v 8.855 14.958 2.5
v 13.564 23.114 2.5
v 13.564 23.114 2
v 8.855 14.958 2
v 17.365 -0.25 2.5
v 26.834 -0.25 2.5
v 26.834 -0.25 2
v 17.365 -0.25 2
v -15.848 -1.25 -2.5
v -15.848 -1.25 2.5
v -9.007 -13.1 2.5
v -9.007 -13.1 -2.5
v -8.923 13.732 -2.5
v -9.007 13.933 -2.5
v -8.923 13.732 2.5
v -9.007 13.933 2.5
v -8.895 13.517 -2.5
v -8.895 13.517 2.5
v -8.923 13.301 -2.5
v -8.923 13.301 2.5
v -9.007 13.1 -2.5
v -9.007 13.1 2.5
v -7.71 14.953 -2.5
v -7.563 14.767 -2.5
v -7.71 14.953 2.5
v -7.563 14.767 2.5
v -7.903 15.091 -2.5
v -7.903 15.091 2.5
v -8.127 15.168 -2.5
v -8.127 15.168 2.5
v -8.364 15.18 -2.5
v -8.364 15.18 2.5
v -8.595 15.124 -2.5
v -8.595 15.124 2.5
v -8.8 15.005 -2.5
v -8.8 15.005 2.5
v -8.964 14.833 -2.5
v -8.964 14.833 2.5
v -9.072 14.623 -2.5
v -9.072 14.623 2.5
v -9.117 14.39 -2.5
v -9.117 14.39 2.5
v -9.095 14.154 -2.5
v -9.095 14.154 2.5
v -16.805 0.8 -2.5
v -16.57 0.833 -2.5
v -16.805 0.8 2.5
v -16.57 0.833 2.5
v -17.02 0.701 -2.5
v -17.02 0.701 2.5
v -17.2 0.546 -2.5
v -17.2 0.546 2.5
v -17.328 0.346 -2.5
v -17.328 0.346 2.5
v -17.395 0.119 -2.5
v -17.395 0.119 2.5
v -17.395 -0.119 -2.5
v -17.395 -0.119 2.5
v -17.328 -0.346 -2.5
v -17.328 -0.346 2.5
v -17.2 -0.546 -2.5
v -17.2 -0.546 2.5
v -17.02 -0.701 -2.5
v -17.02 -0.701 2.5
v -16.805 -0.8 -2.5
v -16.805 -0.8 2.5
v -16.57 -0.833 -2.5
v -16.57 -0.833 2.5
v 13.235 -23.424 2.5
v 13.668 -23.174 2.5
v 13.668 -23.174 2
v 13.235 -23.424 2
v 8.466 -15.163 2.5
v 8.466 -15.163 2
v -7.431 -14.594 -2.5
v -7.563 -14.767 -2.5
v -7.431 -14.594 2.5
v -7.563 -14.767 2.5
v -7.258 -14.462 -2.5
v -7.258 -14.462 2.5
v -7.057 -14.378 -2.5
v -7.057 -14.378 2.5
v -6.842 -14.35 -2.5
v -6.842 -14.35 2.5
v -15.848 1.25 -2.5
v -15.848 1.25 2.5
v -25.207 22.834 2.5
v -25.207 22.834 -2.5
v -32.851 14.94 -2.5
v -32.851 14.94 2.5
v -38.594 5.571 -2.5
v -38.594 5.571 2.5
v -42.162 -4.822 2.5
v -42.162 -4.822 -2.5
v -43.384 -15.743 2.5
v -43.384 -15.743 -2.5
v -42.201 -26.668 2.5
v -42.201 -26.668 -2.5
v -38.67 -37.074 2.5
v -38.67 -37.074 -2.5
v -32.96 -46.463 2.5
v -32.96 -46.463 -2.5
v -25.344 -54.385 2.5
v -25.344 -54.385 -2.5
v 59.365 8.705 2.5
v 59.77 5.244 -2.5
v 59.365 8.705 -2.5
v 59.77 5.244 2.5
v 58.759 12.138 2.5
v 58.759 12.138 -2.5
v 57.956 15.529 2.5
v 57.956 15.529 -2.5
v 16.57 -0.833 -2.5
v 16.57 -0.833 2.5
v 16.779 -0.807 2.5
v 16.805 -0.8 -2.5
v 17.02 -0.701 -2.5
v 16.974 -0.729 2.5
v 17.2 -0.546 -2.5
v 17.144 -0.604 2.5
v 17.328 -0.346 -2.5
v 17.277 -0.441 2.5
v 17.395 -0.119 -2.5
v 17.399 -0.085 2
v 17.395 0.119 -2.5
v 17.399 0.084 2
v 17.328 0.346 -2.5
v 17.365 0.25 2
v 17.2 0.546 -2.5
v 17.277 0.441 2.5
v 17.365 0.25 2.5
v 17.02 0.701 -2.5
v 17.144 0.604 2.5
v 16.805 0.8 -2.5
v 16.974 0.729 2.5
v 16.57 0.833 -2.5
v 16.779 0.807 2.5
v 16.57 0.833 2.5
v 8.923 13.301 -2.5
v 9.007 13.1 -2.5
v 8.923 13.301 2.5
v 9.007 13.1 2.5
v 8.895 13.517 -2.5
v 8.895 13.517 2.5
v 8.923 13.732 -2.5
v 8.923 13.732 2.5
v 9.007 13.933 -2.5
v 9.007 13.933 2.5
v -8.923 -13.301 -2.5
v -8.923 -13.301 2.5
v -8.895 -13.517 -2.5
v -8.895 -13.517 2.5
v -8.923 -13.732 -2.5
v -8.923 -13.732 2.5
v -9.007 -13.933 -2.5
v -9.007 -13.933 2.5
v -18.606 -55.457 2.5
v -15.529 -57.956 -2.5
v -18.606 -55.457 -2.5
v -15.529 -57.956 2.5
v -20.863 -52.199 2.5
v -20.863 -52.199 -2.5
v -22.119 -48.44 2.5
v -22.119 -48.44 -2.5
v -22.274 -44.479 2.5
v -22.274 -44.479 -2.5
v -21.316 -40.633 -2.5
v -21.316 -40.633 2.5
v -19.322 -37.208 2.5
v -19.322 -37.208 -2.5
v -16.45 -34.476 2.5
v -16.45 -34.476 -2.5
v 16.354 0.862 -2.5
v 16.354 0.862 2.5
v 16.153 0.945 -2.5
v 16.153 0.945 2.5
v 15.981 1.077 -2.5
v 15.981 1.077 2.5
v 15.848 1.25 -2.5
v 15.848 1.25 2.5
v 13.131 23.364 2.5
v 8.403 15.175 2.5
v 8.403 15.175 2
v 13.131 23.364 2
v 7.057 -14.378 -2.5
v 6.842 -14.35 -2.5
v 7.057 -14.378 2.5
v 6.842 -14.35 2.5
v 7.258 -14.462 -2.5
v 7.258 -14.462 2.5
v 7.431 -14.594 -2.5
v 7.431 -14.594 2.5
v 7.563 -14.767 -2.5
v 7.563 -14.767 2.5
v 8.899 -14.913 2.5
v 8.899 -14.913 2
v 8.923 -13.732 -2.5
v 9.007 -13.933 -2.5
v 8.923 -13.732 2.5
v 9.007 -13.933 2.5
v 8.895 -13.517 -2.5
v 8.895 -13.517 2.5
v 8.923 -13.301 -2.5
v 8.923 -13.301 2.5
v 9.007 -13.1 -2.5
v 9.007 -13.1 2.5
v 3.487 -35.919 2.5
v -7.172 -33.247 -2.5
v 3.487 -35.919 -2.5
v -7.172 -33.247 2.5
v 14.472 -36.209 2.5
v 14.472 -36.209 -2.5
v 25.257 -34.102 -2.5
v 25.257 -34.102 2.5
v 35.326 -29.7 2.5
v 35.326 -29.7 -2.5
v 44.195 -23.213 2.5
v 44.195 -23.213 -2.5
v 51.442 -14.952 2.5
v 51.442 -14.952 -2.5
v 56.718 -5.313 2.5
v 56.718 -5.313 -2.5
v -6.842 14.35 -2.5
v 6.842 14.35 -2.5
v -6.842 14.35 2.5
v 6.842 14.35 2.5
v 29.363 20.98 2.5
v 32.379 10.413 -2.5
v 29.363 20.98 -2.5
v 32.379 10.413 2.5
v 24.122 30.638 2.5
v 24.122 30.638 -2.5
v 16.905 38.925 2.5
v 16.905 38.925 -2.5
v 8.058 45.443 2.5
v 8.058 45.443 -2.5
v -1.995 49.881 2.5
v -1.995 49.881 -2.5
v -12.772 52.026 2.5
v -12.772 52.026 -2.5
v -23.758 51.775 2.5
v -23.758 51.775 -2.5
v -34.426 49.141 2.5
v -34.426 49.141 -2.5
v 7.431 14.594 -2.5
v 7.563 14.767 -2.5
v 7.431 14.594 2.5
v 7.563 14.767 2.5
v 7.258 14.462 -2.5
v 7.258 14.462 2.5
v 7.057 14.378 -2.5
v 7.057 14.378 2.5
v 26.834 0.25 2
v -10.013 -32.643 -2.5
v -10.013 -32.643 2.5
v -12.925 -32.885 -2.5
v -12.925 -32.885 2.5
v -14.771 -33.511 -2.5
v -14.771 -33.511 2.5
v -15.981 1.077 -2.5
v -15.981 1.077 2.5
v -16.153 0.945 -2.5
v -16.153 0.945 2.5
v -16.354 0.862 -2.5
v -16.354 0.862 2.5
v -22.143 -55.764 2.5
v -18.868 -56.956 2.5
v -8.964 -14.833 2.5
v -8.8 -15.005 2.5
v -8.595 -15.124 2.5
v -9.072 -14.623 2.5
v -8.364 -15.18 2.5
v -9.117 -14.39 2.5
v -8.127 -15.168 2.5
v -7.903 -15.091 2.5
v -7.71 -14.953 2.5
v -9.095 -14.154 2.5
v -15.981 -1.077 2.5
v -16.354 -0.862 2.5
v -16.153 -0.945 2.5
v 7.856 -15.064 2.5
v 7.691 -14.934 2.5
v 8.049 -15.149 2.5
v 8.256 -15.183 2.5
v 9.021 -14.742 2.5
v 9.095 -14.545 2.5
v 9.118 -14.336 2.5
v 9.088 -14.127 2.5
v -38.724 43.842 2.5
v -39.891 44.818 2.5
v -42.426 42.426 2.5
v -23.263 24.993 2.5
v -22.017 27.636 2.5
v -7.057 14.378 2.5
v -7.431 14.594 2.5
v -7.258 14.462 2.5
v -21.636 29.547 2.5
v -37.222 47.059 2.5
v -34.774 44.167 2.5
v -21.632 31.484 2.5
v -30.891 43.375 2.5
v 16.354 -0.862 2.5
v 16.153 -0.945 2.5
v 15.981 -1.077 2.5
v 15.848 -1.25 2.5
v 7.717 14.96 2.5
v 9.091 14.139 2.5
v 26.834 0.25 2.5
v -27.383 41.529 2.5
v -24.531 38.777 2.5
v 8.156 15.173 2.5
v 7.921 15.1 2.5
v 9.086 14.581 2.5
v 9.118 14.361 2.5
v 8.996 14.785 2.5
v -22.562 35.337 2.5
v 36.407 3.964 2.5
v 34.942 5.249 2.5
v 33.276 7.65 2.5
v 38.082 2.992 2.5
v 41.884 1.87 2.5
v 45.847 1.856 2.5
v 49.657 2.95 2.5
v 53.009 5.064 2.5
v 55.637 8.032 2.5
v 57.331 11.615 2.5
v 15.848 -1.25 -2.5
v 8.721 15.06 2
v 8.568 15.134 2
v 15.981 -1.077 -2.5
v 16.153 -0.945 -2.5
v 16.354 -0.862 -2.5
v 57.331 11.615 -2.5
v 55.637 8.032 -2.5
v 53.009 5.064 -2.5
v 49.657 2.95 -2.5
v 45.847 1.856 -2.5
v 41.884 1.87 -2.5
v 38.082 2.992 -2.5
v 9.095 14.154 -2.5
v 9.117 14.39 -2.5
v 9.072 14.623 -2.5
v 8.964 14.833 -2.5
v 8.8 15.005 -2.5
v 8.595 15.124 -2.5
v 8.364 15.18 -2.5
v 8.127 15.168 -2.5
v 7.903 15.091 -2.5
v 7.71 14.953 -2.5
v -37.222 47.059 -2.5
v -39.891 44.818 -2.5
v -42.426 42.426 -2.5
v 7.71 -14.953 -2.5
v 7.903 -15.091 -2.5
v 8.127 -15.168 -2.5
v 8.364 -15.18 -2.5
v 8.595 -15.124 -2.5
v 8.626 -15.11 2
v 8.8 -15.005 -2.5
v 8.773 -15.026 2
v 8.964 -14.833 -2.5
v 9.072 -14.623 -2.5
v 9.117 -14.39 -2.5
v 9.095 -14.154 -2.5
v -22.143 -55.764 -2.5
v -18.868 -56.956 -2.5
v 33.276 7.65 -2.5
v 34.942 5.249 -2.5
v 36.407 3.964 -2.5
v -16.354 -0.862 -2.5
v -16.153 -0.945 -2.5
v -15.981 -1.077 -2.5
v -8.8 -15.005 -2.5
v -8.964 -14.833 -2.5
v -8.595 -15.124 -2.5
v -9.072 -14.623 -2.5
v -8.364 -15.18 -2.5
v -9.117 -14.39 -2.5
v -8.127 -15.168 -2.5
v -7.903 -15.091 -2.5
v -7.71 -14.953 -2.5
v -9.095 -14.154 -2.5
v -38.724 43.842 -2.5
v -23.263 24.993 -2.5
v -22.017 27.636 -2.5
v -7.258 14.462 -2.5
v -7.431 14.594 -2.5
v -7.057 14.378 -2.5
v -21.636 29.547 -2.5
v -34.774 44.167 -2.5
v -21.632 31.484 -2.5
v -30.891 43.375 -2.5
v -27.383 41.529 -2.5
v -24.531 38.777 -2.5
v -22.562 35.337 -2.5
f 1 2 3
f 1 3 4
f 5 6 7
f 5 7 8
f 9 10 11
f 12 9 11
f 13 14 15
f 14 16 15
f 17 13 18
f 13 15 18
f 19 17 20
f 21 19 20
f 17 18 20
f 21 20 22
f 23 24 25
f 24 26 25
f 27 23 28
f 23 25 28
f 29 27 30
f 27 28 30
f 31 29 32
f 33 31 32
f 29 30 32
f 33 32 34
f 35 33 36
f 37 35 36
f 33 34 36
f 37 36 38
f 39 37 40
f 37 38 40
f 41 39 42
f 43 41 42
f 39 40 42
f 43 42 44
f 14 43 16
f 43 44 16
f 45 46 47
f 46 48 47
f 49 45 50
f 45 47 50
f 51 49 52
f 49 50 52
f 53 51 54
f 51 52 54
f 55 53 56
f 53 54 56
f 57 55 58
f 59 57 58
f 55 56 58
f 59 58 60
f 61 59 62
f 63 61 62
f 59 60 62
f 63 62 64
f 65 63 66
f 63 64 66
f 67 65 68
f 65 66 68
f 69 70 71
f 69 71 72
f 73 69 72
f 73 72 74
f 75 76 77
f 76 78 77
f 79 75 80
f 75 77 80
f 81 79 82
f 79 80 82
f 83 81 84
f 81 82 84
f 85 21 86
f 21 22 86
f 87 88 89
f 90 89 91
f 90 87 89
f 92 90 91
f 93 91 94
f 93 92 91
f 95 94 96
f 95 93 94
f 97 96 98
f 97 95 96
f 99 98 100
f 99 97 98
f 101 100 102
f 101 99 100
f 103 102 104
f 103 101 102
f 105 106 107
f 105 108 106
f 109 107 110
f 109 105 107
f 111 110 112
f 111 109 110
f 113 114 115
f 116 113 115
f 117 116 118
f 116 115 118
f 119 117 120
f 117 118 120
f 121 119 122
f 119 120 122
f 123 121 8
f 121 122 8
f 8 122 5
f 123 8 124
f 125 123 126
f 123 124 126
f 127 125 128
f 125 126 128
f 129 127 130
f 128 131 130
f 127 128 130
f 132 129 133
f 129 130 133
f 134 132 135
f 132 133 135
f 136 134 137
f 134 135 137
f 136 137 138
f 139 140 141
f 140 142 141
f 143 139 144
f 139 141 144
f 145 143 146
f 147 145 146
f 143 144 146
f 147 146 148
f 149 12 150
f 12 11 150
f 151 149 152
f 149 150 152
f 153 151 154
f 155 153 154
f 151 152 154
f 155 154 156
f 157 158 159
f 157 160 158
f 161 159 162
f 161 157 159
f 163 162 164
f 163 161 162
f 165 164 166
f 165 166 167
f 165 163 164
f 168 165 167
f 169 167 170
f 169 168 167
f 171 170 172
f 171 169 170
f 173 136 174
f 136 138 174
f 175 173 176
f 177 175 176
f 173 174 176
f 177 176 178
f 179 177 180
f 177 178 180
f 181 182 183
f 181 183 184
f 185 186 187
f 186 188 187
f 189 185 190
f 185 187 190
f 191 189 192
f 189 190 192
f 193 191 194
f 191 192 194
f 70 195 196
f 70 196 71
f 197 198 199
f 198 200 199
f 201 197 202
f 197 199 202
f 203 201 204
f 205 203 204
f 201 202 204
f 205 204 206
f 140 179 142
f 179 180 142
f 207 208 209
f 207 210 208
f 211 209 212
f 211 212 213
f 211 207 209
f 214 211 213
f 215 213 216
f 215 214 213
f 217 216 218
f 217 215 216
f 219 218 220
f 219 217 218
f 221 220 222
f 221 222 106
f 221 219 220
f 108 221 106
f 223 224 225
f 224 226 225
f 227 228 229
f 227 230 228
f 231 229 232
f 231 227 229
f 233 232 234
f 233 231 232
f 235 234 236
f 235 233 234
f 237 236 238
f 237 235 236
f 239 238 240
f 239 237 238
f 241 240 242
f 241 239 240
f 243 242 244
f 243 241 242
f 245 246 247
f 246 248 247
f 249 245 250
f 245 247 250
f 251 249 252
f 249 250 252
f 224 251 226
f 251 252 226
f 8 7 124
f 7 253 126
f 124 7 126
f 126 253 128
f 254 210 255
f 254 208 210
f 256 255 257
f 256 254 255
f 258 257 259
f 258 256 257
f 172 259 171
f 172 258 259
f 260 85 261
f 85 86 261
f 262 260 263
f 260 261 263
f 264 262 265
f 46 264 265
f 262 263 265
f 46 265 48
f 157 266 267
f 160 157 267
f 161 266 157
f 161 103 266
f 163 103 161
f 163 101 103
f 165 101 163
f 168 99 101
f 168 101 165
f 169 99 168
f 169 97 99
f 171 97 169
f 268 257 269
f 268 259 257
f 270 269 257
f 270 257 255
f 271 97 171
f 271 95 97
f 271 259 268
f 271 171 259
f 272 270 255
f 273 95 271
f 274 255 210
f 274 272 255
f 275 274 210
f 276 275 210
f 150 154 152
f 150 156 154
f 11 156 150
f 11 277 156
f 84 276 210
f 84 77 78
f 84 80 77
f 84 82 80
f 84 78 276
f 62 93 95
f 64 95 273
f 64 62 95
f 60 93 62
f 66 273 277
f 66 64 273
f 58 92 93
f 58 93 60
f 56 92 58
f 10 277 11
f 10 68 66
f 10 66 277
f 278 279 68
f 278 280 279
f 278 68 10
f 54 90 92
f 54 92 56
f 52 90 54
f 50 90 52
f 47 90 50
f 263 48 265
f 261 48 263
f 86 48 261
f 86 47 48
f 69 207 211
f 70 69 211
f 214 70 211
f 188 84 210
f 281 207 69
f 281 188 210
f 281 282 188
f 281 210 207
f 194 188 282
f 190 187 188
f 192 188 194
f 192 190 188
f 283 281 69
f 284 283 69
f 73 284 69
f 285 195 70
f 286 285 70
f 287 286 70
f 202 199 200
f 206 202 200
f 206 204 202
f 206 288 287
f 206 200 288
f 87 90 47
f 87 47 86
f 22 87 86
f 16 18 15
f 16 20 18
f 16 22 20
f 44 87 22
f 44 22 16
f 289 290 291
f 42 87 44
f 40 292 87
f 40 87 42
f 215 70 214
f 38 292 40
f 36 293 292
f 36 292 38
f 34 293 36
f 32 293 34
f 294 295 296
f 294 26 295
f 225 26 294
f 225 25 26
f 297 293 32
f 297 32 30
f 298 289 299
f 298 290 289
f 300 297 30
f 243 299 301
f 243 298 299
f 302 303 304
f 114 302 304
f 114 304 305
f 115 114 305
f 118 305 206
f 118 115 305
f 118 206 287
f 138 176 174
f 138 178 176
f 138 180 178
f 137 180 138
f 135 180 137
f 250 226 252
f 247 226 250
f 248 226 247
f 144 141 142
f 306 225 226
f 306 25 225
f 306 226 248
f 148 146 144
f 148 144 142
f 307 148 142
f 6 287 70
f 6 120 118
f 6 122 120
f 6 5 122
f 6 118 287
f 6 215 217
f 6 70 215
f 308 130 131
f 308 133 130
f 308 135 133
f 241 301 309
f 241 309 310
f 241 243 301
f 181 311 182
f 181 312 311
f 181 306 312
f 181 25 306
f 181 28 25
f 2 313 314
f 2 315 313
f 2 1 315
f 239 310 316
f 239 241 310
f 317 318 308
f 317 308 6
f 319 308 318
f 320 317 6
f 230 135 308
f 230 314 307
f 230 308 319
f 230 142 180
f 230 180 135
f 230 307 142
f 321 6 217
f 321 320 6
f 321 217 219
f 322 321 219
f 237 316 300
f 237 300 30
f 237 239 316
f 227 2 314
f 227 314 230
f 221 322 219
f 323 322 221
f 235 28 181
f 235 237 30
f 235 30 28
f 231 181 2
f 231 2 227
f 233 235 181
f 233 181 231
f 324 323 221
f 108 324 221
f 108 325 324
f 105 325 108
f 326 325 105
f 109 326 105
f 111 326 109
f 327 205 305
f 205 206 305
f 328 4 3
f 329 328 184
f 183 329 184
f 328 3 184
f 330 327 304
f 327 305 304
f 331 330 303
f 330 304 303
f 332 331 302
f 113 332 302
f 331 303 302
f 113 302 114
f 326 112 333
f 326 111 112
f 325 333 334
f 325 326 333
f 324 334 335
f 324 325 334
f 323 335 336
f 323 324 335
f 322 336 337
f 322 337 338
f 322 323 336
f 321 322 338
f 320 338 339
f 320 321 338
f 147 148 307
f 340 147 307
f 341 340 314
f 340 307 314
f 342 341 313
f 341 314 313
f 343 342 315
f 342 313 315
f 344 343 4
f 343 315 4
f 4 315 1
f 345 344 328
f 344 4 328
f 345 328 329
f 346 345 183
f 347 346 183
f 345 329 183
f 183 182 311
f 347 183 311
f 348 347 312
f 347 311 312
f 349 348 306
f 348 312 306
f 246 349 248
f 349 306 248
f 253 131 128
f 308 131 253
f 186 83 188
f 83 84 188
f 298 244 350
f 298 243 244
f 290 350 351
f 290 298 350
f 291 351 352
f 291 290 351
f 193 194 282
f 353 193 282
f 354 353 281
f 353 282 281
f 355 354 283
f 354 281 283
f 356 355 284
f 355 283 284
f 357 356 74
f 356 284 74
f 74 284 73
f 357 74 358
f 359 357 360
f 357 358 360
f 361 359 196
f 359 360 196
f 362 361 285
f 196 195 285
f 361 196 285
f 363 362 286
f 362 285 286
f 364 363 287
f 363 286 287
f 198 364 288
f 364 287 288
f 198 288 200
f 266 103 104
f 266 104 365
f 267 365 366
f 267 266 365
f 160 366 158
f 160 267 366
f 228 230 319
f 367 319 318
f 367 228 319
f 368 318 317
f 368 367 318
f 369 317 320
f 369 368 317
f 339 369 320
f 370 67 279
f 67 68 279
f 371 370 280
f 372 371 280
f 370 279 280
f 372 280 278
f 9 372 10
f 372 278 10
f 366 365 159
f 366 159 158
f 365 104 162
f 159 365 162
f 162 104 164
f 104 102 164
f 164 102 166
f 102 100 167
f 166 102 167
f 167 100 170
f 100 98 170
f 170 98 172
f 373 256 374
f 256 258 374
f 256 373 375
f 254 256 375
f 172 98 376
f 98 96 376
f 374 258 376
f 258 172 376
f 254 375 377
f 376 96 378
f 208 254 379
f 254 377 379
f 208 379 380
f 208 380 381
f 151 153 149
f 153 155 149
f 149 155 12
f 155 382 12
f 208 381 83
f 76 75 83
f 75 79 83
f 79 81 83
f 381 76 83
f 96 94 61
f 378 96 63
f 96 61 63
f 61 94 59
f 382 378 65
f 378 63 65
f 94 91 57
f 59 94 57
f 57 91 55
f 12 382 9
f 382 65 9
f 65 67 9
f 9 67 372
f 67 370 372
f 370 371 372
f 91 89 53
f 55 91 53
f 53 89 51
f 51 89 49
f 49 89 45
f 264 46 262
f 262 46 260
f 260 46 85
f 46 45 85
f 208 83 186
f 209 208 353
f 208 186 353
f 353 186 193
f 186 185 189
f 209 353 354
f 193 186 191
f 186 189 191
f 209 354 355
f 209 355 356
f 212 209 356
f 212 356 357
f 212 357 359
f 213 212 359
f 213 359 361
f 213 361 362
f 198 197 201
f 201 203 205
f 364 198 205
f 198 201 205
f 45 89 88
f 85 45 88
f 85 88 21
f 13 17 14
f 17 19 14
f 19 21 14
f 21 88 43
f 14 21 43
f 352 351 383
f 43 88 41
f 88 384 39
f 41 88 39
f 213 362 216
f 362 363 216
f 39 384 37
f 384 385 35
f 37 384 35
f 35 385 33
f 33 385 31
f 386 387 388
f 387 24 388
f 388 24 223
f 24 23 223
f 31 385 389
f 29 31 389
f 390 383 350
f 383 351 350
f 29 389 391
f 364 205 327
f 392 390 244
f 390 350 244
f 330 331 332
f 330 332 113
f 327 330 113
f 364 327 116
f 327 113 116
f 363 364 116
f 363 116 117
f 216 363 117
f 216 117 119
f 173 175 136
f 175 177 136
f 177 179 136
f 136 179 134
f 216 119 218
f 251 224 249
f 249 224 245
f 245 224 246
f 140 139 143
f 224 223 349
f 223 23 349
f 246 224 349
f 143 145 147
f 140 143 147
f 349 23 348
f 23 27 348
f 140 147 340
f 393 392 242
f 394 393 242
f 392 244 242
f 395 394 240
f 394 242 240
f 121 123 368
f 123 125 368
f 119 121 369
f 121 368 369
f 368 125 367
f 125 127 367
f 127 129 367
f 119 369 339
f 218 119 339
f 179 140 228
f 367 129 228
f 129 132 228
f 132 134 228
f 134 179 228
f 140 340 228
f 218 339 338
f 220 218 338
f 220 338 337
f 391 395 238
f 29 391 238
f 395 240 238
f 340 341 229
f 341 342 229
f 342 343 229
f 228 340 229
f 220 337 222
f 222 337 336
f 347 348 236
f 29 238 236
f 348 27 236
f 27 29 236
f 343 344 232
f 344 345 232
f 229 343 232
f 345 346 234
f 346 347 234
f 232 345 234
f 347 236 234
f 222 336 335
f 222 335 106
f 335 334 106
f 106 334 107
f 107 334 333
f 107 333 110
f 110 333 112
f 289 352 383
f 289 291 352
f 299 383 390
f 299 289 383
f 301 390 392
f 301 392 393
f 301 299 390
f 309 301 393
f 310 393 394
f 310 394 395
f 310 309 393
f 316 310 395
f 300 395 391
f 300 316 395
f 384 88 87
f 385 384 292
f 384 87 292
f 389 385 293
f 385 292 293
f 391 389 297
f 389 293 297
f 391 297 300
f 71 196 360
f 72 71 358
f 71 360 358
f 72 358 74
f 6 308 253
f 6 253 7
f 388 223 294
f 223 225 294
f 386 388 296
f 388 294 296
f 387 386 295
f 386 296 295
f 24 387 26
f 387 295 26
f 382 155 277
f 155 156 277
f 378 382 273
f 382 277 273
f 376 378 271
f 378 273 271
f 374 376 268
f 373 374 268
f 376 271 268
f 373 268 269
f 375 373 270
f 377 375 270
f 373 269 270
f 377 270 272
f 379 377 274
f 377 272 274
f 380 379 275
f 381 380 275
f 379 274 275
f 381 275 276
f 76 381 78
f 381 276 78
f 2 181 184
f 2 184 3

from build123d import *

# Parameters (mm, degrees)
BOSS_EXTRUDE1_DEPTH = 2.5
FILLET1_R           = 10
CUT_EXTRUDE1_DEPTH  = 0.5


with BuildPart() as part:
    # Sketch1 → Boss-Extrude1 (new, symmetric)
    with BuildSketch(Plane.XY):
        with BuildLine():
            ThreePointArc((-34.426436475, 49.140822863), (-38.572797774, 45.958016405), (-42.426406871, 42.426406871))
            ThreePointArc((-42.426406871, 42.426406871), (-26.29235792, 40.654943242), (-22.609103215, 24.847373735))
            ThreePointArc((-22.609103215, 24.847373735), (-43.353983992, -14.099744614), (-25.343982725, -54.38457998))
            ThreePointArc((-25.343982725, -54.38457998), (-20.514410827, -56.38403097), (-15.529142706, -57.955549577))
            ThreePointArc((-15.529142706, -57.955549577), (-22.062034677, -43.097321505), (-10.213905264, -32.003744609))
            ThreePointArc((-10.213905264, -32.003744609), (33.887729018, -30.495779185), (59.7704192, 5.243757117))
            ThreePointArc((59.7704192, 5.243757117), (59.087208601, 10.426014565), (57.955549577, 15.529142706))
            ThreePointArc((57.955549577, 15.529142706), (48.354392597, 2.442378263), (32.82300848, 7.156370874))
            ThreePointArc((32.82300848, 7.156370874), (9.466254973, 44.595523799), (-34.426436475, 49.140822863))
        make_face()
        with BuildLine():
            Line((-15.848264889, -1.25), (-9.006664199, -13.1))
            ThreePointArc((-9.006664199, -13.1), (-8.895018703, -13.516666667), (-9.006664199, -13.933333333))
            ThreePointArc((-9.006664199, -13.933333333), (-8.70164303, -15.071687836), (-7.563288526, -14.766666667))
            ThreePointArc((-7.563288526, -14.766666667), (-7.258267357, -14.461645497), (-6.84160069, -14.35))
            Line((-6.84160069, -14.35), (6.84160069, -14.35))
            ThreePointArc((6.84160069, -14.35), (7.258267357, -14.461645497), (7.563288526, -14.766666667))
            ThreePointArc((7.563288526, -14.766666667), (8.70164303, -15.071687836), (9.006664199, -13.933333333))
            ThreePointArc((9.006664199, -13.933333333), (8.895018703, -13.516666667), (9.006664199, -13.1))
            Line((9.006664199, -13.1), (15.848264889, -1.25))
            ThreePointArc((15.848264889, -1.25), (16.153286059, -0.94497883), (16.569952726, -0.833333333))
            ThreePointArc((16.569952726, -0.833333333), (17.403286059, 0), (16.569952726, 0.833333333))
            ThreePointArc((16.569952726, 0.833333333), (16.153286059, 0.94497883), (15.848264889, 1.25))
            Line((15.848264889, 1.25), (9.006664199, 13.1))
            ThreePointArc((9.006664199, 13.1), (8.895018703, 13.516666667), (9.006664199, 13.933333333))
            ThreePointArc((9.006664199, 13.933333333), (8.70164303, 15.071687836), (7.563288526, 14.766666667))
            ThreePointArc((7.563288526, 14.766666667), (7.258267357, 14.461645497), (6.84160069, 14.35))
            Line((6.84160069, 14.35), (-6.84160069, 14.35))
            ThreePointArc((-6.84160069, 14.35), (-7.258267357, 14.461645497), (-7.563288526, 14.766666667))
            ThreePointArc((-7.563288526, 14.766666667), (-8.70164303, 15.071687836), (-9.006664199, 13.933333333))
            ThreePointArc((-9.006664199, 13.933333333), (-8.895018703, 13.516666667), (-9.006664199, 13.1))
            Line((-9.006664199, 13.1), (-15.848264889, 1.25))
            ThreePointArc((-15.848264889, 1.25), (-16.153286059, 0.94497883), (-16.569952726, 0.833333333))
            ThreePointArc((-16.569952726, 0.833333333), (-17.403286059, 0), (-16.569952726, -0.833333333))
            ThreePointArc((-16.569952726, -0.833333333), (-16.153286059, -0.94497883), (-15.848264889, -1.25))
        make_face(mode=Mode.SUBTRACT)
    extrude(amount=BOSS_EXTRUDE1_DEPTH, both=True)

    # Fillet1
    fillet1_edges = [part.edges().sort_by_distance(p)[0] for p in [
        (32.82300848, 7.156370874, 0),
        (-10.213905264, -32.003744609, 0),
        (-22.609103215, 24.847373735, 0),
    ]]
    fillet(fillet1_edges, radius=FILLET1_R)

    # Sketch2 → Cut-Extrude1 (cut)
    with BuildSketch(Plane.XY.offset(2.5)):
        Polygon((8.66814938, -14.513675135), (13.66814938, -23.173929172), (13.235136679, -23.423929172), (8.235136679, -14.763675135), align=None)
        Polygon((16.834018905, -0.25029747), (16.834004031, 0.249702529), (26.834004027, 0.25), (26.8340189, -0.25), align=None)
        Polygon((8.564068882, 14.452995813), (8.131041308, 14.702970051), (13.130526065, 23.363521544), (13.563553639, 23.113547307), align=None)
    extrude(amount=-CUT_EXTRUDE1_DEPTH, mode=Mode.SUBTRACT)


solid = part.part
